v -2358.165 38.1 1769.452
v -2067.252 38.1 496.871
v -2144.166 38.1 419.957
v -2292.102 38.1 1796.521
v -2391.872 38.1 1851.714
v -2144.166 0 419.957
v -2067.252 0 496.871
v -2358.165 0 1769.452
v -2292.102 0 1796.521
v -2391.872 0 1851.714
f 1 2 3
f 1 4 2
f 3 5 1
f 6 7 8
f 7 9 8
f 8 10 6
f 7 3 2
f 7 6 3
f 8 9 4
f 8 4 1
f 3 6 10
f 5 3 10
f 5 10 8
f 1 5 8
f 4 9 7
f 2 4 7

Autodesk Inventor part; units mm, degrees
ref_plane "YZ Plane" through (0, 0, 0) normal (1, 0, 0) x (0, 1, 0)
ref_plane "XZ Plane" through (0, 0, 0) normal (0, 1, 0) x (-1, 0, 0)
ref_plane "XY Plane" through (0, 0, 0) normal (0, 0, 1) x (1, 0, 0)
sketch "Sketch1" plane through (0, 0, 0) normal (0, 1, 0) x (-1, 0, 0)
  line L0 (0, 0) -> (0, -1219.2)
  line L1 (0, 0) -> (88.9, 0)
  line L2 (88.9, 0) -> (88.9, -1219.2)
  line L3 (88.9, -1219.2) -> (0, -1219.2)
  line L4 (0, 0) -> (0, 1219.2) construction
  line L5 (0, 1219.2) -> (1219.2, 1219.2) construction
  line L6 (0, 1219.2) -> (0, 3657.6) construction
  line L7 (0, 3657.6) -> (0, 4876.8) construction
  line L8 (0, 4876.8) -> (0, 6096) construction
  line L9 (0, -1219.2) -> (2438.4, -1219.2) construction
  line L10 (0, 6096) -> (2438.4, 6096) construction
  line L11 (2438.4, 6096) -> (2438.4, -1219.2) construction
  line L12 (0, 3657.6) -> (0, 3352.8) construction
  line L13 (0, 3352.8) -> (2438.4, 3352.8) construction
  line L14 (2438.4, 3352.8) -> (1219.2, 3352.8)
  line L15 (1219.2, 3352.8) -> (1219.2, 3263.9)
  line L16 (1219.2, 3263.9) -> (2438.4, 3263.9)
  line L17 (2438.4, 3263.9) -> (2438.4, 3352.8)
  line L18 (0, 6096) -> (862.1046, 6958.1046)
  line L19 (862.1046, 6958.1046) -> (924.9664, 6895.2428)
  line L20 (924.9664, 6895.2428) -> (62.8618, 6033.1382)
  line L21 (62.8618, 6033.1382) -> (0, 6096)
  line L22 (0, 4876.8) -> (1219.2, 4876.8) construction
  line L23 (1219.2, 4876.8) -> (2081.3046, 5738.9046)
  line L24 (1219.2, 1219.2) -> (2081.3046, 357.0954)
  line L25 (2081.3046, 357.0954) -> (2018.4428, 294.2336)
  line L26 (2018.4428, 294.2336) -> (1156.3382, 1156.3382)
  line L27 (1156.3382, 1156.3382) -> (1219.2, 1219.2)
  line L28 (2018.4428, 294.2336) -> (88.9, -1219.2)
  line L29 (2081.3046, 357.0954) -> (2144.1664, 419.9572)
  line L30 (2144.1664, 419.9572) -> (1282.0618, 1282.0618)
  line L31 (1282.0618, 1282.0618) -> (1219.2, 1219.2)
  line L32 (2438.4, 3352.8) -> (2438.4, 3441.7)
  line L33 (2438.4, 3441.7) -> (1219.2, 3441.7)
  line L34 (1219.2, 3441.7) -> (1219.2, 3352.8)
  line L35 (1156.3382, 4939.6618) -> (1282.0618, 4813.9382)
  line L36 (2018.4428, 5801.7664) -> (2144.1664, 5676.0428)
  line L37 (1282.0618, 4813.9382) -> (2144.1664, 5676.0428)
  line L38 (2018.4428, 5801.7664) -> (1156.3382, 4939.6618)
  line L39 (2018.4428, 5801.7664) -> (924.9664, 6895.2428)
  line L40 (62.8618, 6033.1382) -> (1156.3382, 4939.6618)
  line L41 (1233.6206, 4168.8855) -> (1267.6412, 4086.7527)
  line L42 (1263.7078, 2313.9849) -> (1230.0006, 2231.7229)
  arc A0 (862.1046, 6958.1046) -> (0, 6096) centre (431.0523, 6527.0523) ccw
  line L43 (1246.8542, 2272.8539) -> (2375.0183, 1810.583)
  line L44 (2391.8719, 1851.7139) -> (2358.1646, 1769.452)
  line L45 (2391.8719, 1851.7139) -> (1263.7078, 2313.9849)
  line L46 (1230.0006, 2231.7229) -> (2358.1646, 1769.452)
  line L47 (1230.0006, 2231.7229) -> (1219.2, 3263.9)
  line L48 (2144.1664, 419.9572) -> (2391.8719, 1851.7139)
  line L49 (2391.8719, 1851.7139) -> (2438.4, 3263.9)
  line L50 (1219.2, 3441.7) -> (1233.6206, 4168.8855)
  line L51 (1250.6309, 4127.8191) -> (2377.0248, 4594.3867)
  line L52 (2360.0145, 4635.4532) -> (2394.0351, 4553.3203)
  line L53 (2394.0351, 4553.3203) -> (1267.6412, 4086.7527)
  line L54 (2360.0145, 4635.4532) -> (1233.6206, 4168.8855)
  line L55 (2394.0351, 4553.3203) -> (2144.1664, 5676.0428)
  line L56 (2438.4, 3441.7) -> (2394.0351, 4553.3203)
  line L57 (2144.1664, 5676.0428) -> (2057.3895, 5656.7301)
  line L58 (2394.0351, 4553.3203) -> (2305.2058, 4549.7751)
  line L59 (2394.0351, 4553.3203) -> (2307.2582, 4534.0076)
  line L60 (2307.2582, 4534.0076) -> (2057.3895, 5656.7301)
  line L61 (2438.4, 3441.7) -> (2349.5707, 3438.1548)
  line L62 (2349.5707, 3438.1548) -> (2305.2058, 4549.7751)
  line L63 (1219.2, 3441.7) -> (1308.0825, 3439.9374)
  line L64 (1233.6206, 4168.8855) -> (1322.5031, 4167.1229)
  line L65 (1322.5031, 4167.1229) -> (1308.0825, 3439.9374)
  line L66 (2018.4428, 5801.7664) -> (1955.581, 5738.9046)
  line L67 (1955.581, 5738.9046) -> (862.1046, 6832.381)
  line L68 (924.9664, 6895.2428) -> (862.1046, 6832.381)
  line L69 (62.8618, 6033.1382) -> (125.7236, 6096)
  line L70 (62.8618, 6033.1382) -> (125.7236, 6096)
  line L71 (125.7236, 6096) -> (1219.2, 5002.5236)
  line L72 (1156.3382, 1156.3382) -> (0, 0)
  line L73 (0, 0) -> (62.8618, -62.8618)
  line L74 (1156.3382, 1156.3382) -> (1219.2, 1093.4764)
  line L75 (1219.2, 1093.4764) -> (62.8618, -62.8618)
  line L76 (2018.4428, 294.2336) -> (1963.5776, 364.1837)
  line L77 (88.9, -1219.2) -> (34.0348, -1149.2499)
  line L78 (34.0348, -1149.2499) -> (1963.5776, 364.1837)
  line L79 (2144.1664, 419.9572) -> (2056.5677, 435.1125)
  line L80 (2391.8719, 1851.7139) -> (2304.2732, 1866.8692)
  line L81 (2391.8719, 1851.7139) -> (2303.0201, 1854.6414)
  line L82 (2304.2732, 1866.8692) -> (2056.5677, 435.1125)
  line L83 (1230.0006, 2231.7229) -> (1318.8957, 2232.6531)
  line L84 (1219.2, 3263.9) -> (1308.0951, 3264.8302)
  line L85 (1308.0951, 3264.8302) -> (1318.8957, 2232.6531)
  line L86 (2438.4, 3263.9) -> (2349.5482, 3266.8275)
  line L87 (2349.5482, 3266.8275) -> (2303.0201, 1854.6414)
  line L88 (88.9, 0) -> (125.7236, 0)
  line L89 (1233.6206, 4168.8855) -> (1219.2, 4876.8)
  line L90 (1233.6206, 4168.8855) -> (1322.5022, 4170.6961)
  line L91 (1219.2, 4876.8) -> (1308.0816, 4878.6106)
  line L92 (1308.0816, 4878.6106) -> (1322.5022, 4170.6961)
  line L93 (1282.0618, 4813.9382) -> (1309.9674, 4786.0326)
  line L94 (1267.6412, 4086.7527) -> (1318.4756, 3964.0275)
  line L95 (2360.0145, 4635.4532) -> (2374.4273, 4641.4231)
  line L96 (1230.0006, 2231.7229) -> (1219.2, 1219.2)
  line L97 (1230.0006, 2231.7229) -> (1318.8955, 2230.7747)
  line L98 (1219.2, 1219.2) -> (1308.0949, 1218.2518)
  line L99 (1308.0949, 1218.2518) -> (1318.8955, 2230.7747)
  line L100 (1282.0618, 1282.0618) -> (1309.0636, 1309.0636)
  line L101 (1263.7078, 2313.9849) -> (1316.7428, 2438.4)
  line L102 (2358.1646, 1769.452) -> (2376.5379, 1763.082)
  point P0 (1770.957, 2057.4547)
  point P1 (1955.1236, 357.5528)
  point P2 (88.9, -1106.2164)
  point P3 (2292.1025, 1796.5213)
  point P4 (2067.2525, 496.8711)
  dimension "d0" = 1219.2
  dimension "d2" = 1219.2
  dimension "d3" = 1219.2
  dimension "d16" = 2438.4
  dimension "d17" = 1219.2
  dimension "d18" = 1219.2
  dimension "d20" = 2438.4
  dimension "d21" = 304.8
  dimension "d22" = 1219.2
  dimension "d23" = 88.9
  dimension "d24" = 1219.2
  dimension "d25" = 45
  dimension "d26" = 88.9
  dimension "d27" = 1219.2
  dimension "d28" = 1219.2
  dimension "d29" = 1219.2
  dimension "d31" = 1219.2
  dimension "d32" = 88.9
  dimension "d33" = 88.9
  dimension "d34" = 88.9
  dimension "d35" = 177.8
  dimension "d36" = 177.8
  dimension "d38" = 88.9
  dimension "d39" = 88.9
  dimension "d43" = 1219.2
  dimension "d44" = 88.9
  dimension "d45" = 1219.2
  dimension "d46" = 88.9
  dimension "d47" = 88.9
  dimension "d48" = 88.9
  dimension "d49" = 88.9
  dimension "d50" = 88.9
  dimension "d51" = 88.9
  dimension "d54" = 88.9
  dimension "d55" = 88.9
  dimension "d57" = 88.9
  dimension "d58" = 88.9
  dimension "d59" = 88.9
  dimension "d60" = 88.9
  dimension "d61" = 88.9
  dimension "d64" = 88.9
  dimension "d65" = 88.9
  dimension "d66" = 88.9
  dimension "d69" = 88.9
  dimension "d70" = 88.9
  dimension "d71" = 88.9
  dimension "d72" = 88.9
extrude "Extrusion1" add sketch "Sketch1" along normal blind 38.1 contours L30 L82 L46 L102 L48 | L102 L44 L48
properties part number "S_2x4x57.206"
